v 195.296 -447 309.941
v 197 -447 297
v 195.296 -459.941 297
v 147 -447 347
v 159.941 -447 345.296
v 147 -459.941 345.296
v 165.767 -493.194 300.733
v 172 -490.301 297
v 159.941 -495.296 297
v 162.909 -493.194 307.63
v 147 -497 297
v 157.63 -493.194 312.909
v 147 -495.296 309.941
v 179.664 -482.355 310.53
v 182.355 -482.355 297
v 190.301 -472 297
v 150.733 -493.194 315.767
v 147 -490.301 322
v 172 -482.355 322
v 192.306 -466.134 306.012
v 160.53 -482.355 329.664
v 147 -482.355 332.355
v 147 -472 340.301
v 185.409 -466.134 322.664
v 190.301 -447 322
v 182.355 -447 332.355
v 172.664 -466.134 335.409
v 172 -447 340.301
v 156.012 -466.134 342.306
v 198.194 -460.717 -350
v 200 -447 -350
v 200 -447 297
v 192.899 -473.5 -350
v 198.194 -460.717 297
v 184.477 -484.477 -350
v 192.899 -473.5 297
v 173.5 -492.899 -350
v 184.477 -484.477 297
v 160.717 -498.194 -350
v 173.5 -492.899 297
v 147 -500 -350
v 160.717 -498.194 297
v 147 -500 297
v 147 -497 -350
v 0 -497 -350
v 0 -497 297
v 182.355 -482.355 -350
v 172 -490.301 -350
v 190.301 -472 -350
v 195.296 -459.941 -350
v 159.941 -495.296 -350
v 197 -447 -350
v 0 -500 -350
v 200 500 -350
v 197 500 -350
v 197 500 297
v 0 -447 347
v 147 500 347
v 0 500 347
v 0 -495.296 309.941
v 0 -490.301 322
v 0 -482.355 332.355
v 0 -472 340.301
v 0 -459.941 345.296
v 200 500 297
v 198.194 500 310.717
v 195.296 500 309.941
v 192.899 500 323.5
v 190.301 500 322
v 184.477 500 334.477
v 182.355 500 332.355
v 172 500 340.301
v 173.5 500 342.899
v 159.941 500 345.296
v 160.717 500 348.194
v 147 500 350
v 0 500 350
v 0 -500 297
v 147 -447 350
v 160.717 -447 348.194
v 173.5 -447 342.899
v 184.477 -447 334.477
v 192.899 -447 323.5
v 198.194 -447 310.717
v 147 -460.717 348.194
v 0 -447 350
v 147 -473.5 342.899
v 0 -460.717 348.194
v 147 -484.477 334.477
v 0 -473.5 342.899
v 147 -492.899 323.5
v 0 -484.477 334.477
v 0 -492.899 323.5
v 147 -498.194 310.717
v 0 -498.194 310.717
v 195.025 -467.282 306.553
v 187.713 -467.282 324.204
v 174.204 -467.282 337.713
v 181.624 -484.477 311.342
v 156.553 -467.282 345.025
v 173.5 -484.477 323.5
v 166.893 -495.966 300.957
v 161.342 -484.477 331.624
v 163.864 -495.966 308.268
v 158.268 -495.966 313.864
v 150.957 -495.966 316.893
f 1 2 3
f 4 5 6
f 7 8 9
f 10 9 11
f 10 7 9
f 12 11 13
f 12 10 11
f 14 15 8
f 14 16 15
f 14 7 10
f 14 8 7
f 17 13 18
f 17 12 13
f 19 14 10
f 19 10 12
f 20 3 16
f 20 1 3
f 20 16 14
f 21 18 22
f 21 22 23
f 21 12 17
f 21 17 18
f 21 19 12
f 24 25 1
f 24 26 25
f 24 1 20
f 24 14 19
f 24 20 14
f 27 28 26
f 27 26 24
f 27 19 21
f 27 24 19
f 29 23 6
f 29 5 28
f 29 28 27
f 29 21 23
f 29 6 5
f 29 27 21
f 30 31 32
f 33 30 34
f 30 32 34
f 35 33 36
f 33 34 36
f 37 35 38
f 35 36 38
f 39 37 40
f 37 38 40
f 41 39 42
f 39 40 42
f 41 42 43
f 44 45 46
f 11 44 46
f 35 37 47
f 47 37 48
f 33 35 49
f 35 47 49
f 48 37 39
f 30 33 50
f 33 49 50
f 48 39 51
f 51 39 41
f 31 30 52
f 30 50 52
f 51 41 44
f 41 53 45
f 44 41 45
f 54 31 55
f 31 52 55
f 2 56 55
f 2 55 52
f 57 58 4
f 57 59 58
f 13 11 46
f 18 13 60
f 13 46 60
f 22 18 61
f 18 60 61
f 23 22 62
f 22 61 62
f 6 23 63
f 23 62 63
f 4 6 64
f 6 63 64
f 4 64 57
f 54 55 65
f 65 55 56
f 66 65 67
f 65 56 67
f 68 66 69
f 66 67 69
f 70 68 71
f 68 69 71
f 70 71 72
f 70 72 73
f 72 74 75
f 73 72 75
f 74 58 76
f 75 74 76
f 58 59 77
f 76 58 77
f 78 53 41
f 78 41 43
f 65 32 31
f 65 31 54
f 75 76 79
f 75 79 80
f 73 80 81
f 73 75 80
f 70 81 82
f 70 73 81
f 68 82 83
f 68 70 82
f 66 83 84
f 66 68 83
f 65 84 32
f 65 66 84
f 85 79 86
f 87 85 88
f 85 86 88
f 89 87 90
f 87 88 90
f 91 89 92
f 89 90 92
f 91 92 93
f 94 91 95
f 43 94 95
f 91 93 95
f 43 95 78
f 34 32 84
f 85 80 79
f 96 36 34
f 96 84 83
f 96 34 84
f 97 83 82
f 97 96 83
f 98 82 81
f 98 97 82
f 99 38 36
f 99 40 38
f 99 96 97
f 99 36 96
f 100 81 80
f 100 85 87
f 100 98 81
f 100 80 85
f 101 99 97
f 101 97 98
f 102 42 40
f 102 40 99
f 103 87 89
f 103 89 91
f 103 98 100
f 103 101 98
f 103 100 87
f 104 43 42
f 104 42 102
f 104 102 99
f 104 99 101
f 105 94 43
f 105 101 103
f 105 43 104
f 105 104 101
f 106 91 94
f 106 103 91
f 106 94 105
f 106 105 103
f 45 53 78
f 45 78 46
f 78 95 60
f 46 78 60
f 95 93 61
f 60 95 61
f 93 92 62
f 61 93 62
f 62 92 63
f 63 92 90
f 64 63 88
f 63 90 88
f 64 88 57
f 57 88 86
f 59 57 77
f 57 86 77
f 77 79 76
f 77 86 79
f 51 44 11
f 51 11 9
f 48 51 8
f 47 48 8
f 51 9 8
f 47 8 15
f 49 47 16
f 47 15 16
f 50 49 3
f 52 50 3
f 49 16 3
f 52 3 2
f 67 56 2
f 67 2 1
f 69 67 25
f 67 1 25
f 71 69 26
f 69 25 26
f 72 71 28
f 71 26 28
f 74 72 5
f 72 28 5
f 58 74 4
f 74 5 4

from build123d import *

# Parameters (mm, degrees)
F0_W     = 1000
F0_H     = 700
F1_DEPTH = 200
F2_W     = 997
F2_H     = 697
F3_DEPTH = 197
F4_R     = 50
F5_R     = 50
F6_R     = 53
F7_R     = 53


with BuildPart() as f1:
    # F0 (on Right) → F1 (new body)
    with BuildSketch(Plane.YZ):
        Rectangle(F0_W, F0_H)
    extrude(amount=F1_DEPTH)

    # F2 (on face) → F3 (cut)
    with BuildSketch(Plane(origin=(0, 0, 0), x_dir=(0, -1, 0), z_dir=(-1, 0, 0))):
        with Locations((-1.5, -1.5)):
            Rectangle(F2_W, F2_H)
    extrude(amount=-F3_DEPTH, mode=Mode.SUBTRACT)

    # F4
    f4_edges = [f1.edges().sort_by_distance(p)[0] for p in [
        (197, 1.5, 347),
    ]]
    fillet(f4_edges, radius=F4_R)

    # F5
    f5_edges = [f1.edges().sort_by_distance(p)[0] for p in [
        (197, -497, -26.5),
    ]]
    fillet(f5_edges, radius=F5_R)

    # F6
    f6_edges = [f1.edges().sort_by_distance(p)[0] for p in [
        (200, 0, 350),
    ]]
    fillet(f6_edges, radius=F6_R)

    # F7
    f7_edges = [f1.edges().sort_by_distance(p)[0] for p in [
        (200, -500, -26.5),
    ]]
    fillet(f7_edges, radius=F7_R)


solid = f1.part
